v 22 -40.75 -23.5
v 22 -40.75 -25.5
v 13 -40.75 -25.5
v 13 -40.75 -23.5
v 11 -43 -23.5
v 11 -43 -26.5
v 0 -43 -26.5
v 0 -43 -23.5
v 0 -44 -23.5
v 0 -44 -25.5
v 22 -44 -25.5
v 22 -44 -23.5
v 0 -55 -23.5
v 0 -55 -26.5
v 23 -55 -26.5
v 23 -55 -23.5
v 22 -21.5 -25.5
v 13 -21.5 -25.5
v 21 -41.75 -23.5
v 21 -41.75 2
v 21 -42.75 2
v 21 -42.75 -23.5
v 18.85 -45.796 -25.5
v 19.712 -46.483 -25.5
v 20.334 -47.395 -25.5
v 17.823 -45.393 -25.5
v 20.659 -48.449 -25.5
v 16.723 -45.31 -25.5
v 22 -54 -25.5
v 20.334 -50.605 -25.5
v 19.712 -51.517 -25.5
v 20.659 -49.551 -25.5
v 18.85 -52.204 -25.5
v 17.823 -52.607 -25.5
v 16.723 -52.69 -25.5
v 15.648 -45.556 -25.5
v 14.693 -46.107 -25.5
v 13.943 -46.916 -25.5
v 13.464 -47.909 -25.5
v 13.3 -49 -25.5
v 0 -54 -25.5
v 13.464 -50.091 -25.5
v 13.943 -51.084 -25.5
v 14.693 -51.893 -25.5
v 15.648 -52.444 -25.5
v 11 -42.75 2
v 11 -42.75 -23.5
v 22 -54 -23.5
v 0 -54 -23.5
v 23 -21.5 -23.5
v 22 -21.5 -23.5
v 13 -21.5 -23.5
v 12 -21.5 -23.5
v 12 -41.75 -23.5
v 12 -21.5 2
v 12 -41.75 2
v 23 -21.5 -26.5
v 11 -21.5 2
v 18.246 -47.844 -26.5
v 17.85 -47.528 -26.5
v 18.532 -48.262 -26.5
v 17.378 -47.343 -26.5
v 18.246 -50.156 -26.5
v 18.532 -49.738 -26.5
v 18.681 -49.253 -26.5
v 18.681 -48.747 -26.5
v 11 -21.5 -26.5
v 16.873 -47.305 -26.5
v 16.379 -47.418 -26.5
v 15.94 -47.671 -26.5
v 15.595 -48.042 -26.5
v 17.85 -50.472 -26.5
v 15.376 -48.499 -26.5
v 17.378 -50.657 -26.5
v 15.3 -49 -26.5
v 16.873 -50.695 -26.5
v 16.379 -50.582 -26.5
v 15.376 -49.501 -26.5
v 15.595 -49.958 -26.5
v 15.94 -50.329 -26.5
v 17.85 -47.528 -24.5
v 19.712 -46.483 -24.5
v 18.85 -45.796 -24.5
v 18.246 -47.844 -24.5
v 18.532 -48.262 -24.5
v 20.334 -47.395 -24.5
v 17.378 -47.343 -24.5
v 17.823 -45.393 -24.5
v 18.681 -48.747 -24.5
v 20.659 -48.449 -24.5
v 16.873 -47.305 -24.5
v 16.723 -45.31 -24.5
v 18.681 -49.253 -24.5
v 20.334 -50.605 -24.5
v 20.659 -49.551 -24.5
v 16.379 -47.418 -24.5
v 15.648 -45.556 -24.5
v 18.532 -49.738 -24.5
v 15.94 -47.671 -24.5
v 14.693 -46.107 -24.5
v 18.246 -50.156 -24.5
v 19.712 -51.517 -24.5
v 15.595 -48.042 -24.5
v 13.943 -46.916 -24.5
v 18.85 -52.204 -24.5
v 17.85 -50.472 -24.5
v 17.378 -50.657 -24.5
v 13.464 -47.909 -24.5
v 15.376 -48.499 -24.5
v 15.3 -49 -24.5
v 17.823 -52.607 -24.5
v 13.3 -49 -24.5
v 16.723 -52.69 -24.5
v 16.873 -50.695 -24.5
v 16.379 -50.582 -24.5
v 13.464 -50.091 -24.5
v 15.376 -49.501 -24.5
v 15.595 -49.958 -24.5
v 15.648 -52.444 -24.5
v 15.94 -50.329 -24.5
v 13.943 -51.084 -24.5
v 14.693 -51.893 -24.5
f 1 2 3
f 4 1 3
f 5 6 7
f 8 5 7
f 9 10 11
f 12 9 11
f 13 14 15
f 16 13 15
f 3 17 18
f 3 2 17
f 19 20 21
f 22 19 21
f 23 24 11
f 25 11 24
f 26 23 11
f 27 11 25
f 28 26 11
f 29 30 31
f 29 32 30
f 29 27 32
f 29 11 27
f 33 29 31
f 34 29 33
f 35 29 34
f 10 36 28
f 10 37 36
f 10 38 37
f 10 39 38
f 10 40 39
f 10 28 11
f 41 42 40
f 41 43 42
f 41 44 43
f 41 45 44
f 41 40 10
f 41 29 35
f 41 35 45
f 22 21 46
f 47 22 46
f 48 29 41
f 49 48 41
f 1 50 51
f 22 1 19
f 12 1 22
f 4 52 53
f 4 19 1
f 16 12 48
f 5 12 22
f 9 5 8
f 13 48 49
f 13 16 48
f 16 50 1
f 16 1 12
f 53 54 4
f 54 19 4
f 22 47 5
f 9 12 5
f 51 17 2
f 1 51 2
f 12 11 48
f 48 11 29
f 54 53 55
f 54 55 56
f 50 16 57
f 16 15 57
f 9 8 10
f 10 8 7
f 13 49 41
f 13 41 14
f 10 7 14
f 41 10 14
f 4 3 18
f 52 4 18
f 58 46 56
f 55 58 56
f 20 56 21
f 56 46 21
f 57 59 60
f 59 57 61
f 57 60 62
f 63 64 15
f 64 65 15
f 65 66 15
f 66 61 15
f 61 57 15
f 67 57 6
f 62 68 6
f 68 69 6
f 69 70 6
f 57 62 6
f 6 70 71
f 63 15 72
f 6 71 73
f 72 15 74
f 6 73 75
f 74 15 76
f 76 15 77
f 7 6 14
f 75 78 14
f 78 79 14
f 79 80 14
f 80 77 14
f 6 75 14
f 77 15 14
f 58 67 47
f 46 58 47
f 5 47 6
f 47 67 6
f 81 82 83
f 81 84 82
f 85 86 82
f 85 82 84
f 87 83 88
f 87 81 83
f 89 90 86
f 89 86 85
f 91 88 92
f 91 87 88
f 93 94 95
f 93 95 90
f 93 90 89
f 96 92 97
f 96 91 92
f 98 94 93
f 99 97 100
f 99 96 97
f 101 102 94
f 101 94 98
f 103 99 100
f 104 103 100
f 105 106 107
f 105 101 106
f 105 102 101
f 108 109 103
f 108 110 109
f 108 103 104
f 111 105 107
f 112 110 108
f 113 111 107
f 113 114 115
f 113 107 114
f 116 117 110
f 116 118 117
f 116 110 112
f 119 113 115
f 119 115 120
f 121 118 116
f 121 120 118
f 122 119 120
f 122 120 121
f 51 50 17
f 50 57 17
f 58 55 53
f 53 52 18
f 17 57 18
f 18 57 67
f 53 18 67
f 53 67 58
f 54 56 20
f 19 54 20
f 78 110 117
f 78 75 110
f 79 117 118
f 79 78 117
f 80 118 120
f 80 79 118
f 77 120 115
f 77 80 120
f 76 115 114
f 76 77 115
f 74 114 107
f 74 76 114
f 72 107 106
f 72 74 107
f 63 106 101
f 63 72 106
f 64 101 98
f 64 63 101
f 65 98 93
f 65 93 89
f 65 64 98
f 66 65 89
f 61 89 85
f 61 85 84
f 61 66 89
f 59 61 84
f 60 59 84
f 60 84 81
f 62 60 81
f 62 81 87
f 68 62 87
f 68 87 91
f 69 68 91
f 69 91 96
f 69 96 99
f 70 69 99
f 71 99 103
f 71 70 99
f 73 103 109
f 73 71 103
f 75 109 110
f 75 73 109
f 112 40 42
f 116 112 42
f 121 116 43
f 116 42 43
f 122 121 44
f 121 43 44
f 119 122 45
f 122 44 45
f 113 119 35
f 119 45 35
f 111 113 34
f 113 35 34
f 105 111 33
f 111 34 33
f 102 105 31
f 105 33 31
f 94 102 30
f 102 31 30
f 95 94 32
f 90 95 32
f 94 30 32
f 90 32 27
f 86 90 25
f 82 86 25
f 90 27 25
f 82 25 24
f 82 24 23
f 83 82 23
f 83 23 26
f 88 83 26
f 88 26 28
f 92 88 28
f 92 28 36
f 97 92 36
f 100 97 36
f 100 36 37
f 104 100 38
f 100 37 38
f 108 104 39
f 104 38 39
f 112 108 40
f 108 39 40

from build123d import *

# Parameters (mm, degrees)
SKETCH006_R      = 1.7
EXTRUDE004_DEPTH = 1
EXTRUDE005_DEPTH = 2
SKETCH017_R      = 3.7
SKETCH017_R_2    = 1.7
EXTRUDE014_DEPTH = 1
EXTRUDE003_DEPTH = 27.5


with BuildPart() as extrude004:
    # Sketch006 → Extrude004 (new body)
    with BuildSketch(Plane.XY.offset(10)):
        Polygon((-11, 0), (0, 0), (0, 12), (-23, 12), (-23, -21.5), (-11, -21.5), align=None)
        with Locations((-17, 6)):
            Circle(SKETCH006_R, mode=Mode.SUBTRACT)
    extrude(amount=EXTRUDE004_DEPTH)


with BuildPart() as extrude004_1:
    # Extrude004 placement: moved
    add(extrude004.part.moved(Location((0, 0, -36.5))))


with BuildPart() as extrude005:
    # Sketch007 → Extrude005 (new body)
    with BuildSketch(Plane.XY.offset(10)):
        Polygon((0, 12), (-23, 12), (-23, -21.5), (-22, -21.5), (-22, -2.25), (-13, -2.25), (-13, -21.5), (-11, -21.5), (-11, 0), (0, 0), (0, 1), (-22, 1), (-22, 11), (0, 11), align=None)
    extrude(amount=EXTRUDE005_DEPTH)


with BuildPart() as extrude005_1:
    # Extrude005 placement: moved
    add(extrude005.part.moved(Location((0, 0, -35.5))))


with BuildPart() as extrude014:
    # Sketch017 → Extrude014 (new body)
    with BuildSketch(Plane.XY.offset(10)):
        with Locations((-17, 6)):
            Circle(SKETCH017_R)
        with Locations((-17, 6)):
            Circle(SKETCH017_R_2, mode=Mode.SUBTRACT)
    extrude(amount=EXTRUDE014_DEPTH)


with BuildPart() as extrude014_1:
    # Extrude014 placement: moved
    add(extrude014.part.moved(Location((0, 0, -35.5))))


with BuildPart() as body004:
    # Sketch003 → Extrude003 (new body)
    with BuildSketch(Plane.XY):
        Polygon((-21, -0.25), (-11, -0.25), (-11, -21.5), (-12, -21.5), (-12, -1.25), (-21, -1.25), align=None)
    extrude(amount=-EXTRUDE003_DEPTH)


with BuildPart() as body004_1:
    # Extrude003 placement: moved
    add(body004.part.moved(Location((0, 0, 2))))

    # Fusion013: union Extrude004, Extrude005, Extrude014
    add(extrude004_1.part)
    add(extrude005_1.part)
    add(extrude014_1.part)


with BuildPart() as body005:
    # Part__Mirroring005: instance of Body004
    add(body004_1.part.mirror(Plane(origin=(0, 0, 0), x_dir=(0, -1, 0), z_dir=(1, 0, 0))))


with BuildPart() as part_mirroring006:
    # Part__Mirroring006: instance of Body005
    add(body005.part.mirror(Plane(origin=(0, -21.5, 0), x_dir=(1, 0, 0), z_dir=(0, 1, 0))))


solid = part_mirroring006.part
